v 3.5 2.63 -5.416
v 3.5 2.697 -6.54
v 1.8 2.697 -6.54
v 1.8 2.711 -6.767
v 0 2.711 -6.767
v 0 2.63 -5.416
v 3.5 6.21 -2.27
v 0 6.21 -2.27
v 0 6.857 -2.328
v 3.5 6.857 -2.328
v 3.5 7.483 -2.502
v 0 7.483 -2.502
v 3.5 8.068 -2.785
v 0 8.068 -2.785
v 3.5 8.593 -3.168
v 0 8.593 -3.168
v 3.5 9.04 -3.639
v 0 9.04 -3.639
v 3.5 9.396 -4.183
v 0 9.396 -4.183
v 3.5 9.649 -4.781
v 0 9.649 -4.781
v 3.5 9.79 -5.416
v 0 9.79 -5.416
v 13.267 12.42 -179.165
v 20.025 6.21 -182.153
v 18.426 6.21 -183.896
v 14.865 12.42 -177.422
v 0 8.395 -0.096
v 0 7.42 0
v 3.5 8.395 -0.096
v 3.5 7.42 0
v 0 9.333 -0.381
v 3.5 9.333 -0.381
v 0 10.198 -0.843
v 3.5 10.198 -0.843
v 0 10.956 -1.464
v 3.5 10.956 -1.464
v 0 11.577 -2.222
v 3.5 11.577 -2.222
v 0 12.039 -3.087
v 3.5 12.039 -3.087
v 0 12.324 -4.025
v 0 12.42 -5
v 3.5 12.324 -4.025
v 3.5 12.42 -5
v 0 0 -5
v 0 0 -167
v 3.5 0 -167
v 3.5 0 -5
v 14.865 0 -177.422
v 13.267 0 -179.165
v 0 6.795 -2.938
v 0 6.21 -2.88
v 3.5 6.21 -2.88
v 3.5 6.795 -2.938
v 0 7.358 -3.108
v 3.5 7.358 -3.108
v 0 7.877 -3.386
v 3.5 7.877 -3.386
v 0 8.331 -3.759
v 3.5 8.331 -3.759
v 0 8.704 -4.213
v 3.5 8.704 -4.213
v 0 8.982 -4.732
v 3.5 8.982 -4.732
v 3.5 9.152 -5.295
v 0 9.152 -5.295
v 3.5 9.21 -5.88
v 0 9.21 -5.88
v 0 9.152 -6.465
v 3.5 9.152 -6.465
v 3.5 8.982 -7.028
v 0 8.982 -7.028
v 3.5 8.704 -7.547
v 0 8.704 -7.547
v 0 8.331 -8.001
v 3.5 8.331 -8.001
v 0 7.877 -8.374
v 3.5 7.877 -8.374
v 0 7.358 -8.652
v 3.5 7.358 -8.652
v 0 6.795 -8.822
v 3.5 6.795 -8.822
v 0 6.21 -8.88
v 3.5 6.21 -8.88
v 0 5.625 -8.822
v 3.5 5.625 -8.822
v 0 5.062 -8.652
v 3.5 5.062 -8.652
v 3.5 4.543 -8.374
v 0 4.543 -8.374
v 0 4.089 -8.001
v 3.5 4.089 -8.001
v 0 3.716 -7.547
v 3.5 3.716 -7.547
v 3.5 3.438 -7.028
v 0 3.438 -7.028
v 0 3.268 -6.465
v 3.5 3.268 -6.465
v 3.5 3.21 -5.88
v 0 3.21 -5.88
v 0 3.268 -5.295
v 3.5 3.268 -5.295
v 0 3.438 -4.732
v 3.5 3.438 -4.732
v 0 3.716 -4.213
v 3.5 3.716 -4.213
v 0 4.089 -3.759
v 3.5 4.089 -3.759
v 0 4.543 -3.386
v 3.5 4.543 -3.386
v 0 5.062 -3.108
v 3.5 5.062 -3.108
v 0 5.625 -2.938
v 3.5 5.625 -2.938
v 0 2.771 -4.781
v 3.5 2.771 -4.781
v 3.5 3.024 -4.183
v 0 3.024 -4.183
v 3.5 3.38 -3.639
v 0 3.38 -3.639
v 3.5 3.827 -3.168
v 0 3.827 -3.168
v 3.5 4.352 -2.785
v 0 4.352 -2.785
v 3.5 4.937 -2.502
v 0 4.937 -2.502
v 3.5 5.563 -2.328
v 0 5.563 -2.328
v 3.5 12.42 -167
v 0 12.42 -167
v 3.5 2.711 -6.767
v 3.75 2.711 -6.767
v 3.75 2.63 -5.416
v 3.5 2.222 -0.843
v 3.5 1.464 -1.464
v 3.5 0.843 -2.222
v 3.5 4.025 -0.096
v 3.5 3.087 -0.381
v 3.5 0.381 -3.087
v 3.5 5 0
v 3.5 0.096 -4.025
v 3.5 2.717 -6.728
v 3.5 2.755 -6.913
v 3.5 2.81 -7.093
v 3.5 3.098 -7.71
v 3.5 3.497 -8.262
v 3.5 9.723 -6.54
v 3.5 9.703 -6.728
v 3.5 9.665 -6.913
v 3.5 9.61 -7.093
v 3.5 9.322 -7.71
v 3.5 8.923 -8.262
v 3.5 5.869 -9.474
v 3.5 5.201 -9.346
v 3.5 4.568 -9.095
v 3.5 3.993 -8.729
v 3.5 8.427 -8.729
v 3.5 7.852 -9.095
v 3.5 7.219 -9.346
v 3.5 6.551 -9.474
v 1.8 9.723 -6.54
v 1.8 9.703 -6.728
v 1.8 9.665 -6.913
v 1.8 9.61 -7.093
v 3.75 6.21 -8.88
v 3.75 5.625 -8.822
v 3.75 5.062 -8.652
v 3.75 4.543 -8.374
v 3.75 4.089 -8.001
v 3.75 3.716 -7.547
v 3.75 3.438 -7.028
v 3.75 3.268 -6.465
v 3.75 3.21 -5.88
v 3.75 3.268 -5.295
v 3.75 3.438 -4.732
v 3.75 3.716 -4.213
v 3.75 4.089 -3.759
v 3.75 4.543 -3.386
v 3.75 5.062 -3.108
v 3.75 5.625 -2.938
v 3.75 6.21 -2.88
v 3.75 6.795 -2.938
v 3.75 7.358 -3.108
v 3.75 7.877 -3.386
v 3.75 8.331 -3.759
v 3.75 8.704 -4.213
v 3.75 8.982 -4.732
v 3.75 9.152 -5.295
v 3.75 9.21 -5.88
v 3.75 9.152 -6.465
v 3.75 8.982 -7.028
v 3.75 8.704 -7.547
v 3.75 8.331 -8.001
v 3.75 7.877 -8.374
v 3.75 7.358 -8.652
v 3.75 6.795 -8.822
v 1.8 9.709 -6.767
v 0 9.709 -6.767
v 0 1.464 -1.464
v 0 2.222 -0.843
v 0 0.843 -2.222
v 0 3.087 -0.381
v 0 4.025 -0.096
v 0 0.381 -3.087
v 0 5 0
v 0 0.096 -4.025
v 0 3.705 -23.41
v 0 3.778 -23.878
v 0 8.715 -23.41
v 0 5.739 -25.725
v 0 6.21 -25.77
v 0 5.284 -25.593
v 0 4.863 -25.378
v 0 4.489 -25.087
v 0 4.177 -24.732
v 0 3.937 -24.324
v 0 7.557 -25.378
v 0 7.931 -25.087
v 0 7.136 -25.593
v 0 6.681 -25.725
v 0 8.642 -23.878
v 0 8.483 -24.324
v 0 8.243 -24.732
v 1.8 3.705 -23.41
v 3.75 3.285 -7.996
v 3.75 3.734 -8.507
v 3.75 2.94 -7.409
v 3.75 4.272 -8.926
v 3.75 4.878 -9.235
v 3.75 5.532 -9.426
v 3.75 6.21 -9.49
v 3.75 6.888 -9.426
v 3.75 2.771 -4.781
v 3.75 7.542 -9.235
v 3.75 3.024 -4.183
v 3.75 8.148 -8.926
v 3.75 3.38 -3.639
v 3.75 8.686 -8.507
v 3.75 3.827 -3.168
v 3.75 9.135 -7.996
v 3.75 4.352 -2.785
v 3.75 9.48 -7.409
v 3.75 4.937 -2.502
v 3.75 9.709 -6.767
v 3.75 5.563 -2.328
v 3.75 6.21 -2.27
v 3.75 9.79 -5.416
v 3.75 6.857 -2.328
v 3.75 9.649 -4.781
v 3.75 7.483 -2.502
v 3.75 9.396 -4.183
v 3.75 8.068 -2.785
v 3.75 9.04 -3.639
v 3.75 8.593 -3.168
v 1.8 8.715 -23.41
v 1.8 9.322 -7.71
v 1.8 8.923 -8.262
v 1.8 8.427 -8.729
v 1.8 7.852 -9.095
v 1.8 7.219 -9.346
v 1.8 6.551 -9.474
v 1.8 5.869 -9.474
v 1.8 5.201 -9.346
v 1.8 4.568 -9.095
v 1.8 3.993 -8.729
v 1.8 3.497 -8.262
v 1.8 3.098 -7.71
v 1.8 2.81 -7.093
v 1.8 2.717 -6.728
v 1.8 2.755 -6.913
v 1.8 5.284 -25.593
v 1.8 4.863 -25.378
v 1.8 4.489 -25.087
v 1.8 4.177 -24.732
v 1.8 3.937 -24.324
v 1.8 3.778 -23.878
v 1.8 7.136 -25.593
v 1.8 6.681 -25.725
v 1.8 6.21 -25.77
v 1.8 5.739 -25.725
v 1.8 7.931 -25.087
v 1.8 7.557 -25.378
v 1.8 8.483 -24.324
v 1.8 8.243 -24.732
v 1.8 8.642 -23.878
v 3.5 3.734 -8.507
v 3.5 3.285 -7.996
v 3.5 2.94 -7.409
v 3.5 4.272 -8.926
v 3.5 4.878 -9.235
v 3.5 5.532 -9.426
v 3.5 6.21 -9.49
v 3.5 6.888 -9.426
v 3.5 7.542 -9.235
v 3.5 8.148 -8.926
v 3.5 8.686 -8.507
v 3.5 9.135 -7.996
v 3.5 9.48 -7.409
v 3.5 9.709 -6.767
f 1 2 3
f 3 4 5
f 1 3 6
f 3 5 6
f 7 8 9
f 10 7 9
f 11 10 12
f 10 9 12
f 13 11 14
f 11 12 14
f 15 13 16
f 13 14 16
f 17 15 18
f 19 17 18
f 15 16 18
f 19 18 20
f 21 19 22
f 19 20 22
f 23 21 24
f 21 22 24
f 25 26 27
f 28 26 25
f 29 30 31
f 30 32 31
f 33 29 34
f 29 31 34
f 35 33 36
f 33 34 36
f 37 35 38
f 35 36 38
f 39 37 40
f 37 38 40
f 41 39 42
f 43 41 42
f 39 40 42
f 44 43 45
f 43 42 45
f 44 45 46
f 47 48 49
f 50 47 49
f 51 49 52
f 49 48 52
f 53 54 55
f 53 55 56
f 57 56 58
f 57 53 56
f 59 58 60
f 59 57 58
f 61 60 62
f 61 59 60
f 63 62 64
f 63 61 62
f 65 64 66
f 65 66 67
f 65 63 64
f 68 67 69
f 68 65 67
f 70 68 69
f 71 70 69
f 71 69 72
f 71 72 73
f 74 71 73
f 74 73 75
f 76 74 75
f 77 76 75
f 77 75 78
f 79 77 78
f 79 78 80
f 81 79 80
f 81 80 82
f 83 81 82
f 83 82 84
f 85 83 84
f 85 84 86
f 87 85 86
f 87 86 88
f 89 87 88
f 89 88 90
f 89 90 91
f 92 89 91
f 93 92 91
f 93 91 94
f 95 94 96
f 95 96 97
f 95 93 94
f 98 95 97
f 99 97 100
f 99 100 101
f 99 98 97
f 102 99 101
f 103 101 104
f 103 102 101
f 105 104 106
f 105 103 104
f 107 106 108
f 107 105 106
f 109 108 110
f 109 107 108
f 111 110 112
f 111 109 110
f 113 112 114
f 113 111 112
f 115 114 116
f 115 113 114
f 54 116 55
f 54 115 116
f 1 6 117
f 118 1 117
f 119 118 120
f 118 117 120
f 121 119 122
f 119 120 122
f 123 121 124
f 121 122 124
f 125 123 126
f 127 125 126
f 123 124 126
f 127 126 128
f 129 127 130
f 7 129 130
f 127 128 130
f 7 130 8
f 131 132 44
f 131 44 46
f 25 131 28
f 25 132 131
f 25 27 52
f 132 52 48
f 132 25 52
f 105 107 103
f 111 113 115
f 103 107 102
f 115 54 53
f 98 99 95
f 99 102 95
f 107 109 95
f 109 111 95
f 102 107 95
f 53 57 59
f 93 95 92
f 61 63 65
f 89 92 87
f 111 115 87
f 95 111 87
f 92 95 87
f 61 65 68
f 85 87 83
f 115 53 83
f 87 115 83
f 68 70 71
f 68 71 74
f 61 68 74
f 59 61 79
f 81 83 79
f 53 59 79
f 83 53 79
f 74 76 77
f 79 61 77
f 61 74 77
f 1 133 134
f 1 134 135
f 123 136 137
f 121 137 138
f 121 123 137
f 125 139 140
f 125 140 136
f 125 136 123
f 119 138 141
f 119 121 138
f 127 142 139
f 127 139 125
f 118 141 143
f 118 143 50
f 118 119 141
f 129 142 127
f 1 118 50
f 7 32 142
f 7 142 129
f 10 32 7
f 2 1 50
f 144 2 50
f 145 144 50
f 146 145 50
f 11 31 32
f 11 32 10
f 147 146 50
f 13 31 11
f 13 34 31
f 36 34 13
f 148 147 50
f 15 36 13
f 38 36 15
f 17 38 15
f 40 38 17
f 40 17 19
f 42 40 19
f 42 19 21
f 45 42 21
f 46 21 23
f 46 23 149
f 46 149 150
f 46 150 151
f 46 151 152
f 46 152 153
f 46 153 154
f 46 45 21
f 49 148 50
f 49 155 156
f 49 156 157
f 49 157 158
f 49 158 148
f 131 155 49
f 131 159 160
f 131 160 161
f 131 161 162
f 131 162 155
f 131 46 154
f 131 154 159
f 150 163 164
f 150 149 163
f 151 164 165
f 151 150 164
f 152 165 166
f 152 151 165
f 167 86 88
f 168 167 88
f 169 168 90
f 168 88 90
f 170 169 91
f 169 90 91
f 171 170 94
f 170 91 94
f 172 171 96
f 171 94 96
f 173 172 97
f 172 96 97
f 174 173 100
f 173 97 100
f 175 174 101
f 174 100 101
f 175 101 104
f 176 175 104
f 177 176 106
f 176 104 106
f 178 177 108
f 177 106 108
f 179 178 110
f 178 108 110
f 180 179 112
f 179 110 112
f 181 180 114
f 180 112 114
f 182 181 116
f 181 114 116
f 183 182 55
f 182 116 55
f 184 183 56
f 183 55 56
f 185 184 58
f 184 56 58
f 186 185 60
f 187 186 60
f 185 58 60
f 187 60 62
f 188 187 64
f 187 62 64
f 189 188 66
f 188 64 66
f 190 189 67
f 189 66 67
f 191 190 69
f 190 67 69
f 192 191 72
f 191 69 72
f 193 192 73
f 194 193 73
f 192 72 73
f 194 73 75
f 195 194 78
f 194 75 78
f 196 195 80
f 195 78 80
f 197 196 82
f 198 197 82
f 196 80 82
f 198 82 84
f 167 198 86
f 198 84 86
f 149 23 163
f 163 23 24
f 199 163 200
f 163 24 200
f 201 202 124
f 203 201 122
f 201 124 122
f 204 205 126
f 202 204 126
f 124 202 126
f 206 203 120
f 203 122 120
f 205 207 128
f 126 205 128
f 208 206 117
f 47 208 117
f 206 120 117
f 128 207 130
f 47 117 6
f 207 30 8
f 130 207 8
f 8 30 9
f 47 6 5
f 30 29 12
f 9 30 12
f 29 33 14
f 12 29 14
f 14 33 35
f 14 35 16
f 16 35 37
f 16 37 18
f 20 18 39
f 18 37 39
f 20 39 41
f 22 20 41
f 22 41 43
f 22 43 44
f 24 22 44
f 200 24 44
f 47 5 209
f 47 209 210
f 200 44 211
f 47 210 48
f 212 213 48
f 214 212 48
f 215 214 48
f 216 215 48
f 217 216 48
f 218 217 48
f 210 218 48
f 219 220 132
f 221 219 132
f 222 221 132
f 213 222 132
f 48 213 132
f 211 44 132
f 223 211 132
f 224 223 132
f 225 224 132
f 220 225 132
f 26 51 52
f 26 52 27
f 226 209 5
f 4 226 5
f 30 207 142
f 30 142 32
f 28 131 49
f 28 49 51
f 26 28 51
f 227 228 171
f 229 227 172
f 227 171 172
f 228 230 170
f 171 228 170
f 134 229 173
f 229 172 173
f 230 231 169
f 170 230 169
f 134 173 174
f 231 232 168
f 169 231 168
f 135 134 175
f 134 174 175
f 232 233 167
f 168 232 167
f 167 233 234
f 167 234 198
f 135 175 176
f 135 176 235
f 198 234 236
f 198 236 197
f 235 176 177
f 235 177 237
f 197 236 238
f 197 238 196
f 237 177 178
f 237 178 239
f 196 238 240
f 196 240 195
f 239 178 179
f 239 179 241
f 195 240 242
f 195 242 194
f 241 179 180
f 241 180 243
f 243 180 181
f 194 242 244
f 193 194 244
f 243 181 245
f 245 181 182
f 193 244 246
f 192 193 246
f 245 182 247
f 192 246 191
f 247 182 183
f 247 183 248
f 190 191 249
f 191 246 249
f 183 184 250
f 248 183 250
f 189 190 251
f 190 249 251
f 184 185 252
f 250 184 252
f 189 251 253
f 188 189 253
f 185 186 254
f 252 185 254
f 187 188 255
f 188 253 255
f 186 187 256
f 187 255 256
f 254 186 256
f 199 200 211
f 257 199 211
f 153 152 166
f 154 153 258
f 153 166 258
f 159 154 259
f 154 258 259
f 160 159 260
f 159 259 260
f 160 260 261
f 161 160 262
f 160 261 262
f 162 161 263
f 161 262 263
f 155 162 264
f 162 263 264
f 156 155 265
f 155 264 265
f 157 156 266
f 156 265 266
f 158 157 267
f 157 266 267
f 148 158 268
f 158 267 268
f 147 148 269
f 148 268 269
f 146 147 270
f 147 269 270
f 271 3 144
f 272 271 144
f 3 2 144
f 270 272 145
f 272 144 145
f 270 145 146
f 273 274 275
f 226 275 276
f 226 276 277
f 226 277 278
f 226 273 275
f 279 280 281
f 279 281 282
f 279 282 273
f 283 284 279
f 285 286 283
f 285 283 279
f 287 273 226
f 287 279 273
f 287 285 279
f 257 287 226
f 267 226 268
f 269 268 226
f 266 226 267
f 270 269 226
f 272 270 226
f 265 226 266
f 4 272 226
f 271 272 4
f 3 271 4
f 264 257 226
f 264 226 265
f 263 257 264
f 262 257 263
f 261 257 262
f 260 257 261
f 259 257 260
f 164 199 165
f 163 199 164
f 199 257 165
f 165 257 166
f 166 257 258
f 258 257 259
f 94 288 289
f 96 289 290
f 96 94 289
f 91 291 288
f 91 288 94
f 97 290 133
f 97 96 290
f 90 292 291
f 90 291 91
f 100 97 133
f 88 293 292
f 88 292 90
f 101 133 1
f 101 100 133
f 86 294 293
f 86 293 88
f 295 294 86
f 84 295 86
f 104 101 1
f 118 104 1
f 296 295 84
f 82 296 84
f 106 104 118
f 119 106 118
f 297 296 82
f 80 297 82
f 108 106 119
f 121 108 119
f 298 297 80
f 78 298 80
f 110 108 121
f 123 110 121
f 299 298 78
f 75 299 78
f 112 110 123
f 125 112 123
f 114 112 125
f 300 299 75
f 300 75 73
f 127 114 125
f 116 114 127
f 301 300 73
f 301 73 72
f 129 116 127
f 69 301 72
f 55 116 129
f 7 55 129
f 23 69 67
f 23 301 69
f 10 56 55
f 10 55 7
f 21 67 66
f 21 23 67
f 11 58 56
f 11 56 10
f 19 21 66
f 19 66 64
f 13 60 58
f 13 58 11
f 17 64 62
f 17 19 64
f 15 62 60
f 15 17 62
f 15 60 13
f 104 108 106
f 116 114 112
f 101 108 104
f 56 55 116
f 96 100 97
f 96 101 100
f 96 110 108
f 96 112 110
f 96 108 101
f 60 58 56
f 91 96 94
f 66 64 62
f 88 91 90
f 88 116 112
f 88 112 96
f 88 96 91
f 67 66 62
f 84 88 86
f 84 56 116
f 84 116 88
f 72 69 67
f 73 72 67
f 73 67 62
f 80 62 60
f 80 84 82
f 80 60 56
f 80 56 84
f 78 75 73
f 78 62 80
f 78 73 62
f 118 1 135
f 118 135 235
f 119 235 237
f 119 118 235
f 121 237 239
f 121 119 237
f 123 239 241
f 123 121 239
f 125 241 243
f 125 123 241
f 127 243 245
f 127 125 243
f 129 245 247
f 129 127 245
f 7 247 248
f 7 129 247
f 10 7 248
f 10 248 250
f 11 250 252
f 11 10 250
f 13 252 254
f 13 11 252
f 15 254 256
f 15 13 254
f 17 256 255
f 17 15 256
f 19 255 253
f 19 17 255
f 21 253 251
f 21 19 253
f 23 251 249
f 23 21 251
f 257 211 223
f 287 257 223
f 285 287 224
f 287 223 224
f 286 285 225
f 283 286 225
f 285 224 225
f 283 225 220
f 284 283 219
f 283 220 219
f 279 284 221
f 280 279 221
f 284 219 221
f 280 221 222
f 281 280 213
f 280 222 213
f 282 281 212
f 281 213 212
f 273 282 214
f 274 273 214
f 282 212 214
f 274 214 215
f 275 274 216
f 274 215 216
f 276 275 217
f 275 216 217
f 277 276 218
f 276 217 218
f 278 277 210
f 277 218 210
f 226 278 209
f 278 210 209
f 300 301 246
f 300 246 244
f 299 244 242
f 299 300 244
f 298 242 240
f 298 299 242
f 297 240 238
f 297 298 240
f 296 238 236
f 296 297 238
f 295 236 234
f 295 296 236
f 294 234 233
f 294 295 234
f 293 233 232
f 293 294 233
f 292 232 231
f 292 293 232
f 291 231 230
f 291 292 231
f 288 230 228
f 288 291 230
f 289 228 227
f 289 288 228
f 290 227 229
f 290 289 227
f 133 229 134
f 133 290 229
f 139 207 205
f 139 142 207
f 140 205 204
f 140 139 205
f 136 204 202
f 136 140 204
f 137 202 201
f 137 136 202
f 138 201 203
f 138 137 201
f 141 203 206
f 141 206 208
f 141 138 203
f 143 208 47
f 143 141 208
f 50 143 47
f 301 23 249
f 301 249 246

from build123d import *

# Parameters (mm, degrees)
SKETCH1_W               = 167
SKETCH1_H               = 12.42
BOSS_EXTRUDE1_DEPTH     = 3.5
SKETCH7_R               = 3
CUT_EXTRUDE1_DEPTH      = 188.444675571
CUT_EXTRUDE2_DEPTH      = 1.8
FILLET1_R               = 5
FILLET2_R               = 2
BOSS_EXTRUDE2_START     = -3.5
SKETCH7_5_R             = 3
BOSS_EXTRUDE2_DEPTH     = 0.25
CUT_EXTRUDE5_DEPTH      = 188.449510269
CUT_EXTRUDE5_DEPTH_BACK = 188.449510269
BOSS_EXTRUDE3_DEPTH     = 12.42
CUT_EXTRUDE7_DEPTH      = 140.602620265
CUT_EXTRUDE7_DEPTH_BACK = 140.602620265


with BuildPart() as part:
    # Sketch1 → Boss-Extrude1 (new body)
    with BuildSketch(Plane(origin=(0, 0, 0), x_dir=(0, 0, -1), z_dir=(1, 0, 0))):
        with Locations((83.5, 6.21)):
            Rectangle(SKETCH1_W, SKETCH1_H)
        Polygon((180, 0), (167, 0), (167, 12.42), (180, 12.42), (187, 6.21), align=None)
    extrude(amount=BOSS_EXTRUDE1_DEPTH)

    # Sketch7 → Cut-Extrude1 (cut, through all)
    with BuildSketch(Plane.ZY):
        with BuildLine():
            ThreePointArc((-2.27, 6.21), (-3.168108515, 8.592801832), (-5.415564859, 9.79))
            Line((-5.415564859, 9.79), (-6.76734979, 9.709244254))
            ThreePointArc((-6.76734979, 9.709244254), (-9.49, 6.21), (-6.76734979, 2.710755746))
            Line((-6.76734979, 2.710755746), (-5.415564859, 2.63))
            ThreePointArc((-5.415564859, 2.63), (-3.168108515, 3.827198168), (-2.27, 6.21))
        make_face()
        with Locations((-5.88, 6.21)):
            Circle(SKETCH7_R, mode=Mode.SUBTRACT)
    extrude(amount=-CUT_EXTRUDE1_DEPTH, mode=Mode.SUBTRACT)


with BuildPart() as cut_extrude1_piece_1:
    # of the separate pieces the step leaves, piece 1, a body of its own (cut_extrude1_pieces)
    add(part.part.solids().sort_by_distance((0, 0, 0))[0])

    # Sketch7<3> → Cut-Extrude2 (cut)
    with BuildSketch(Plane.ZY):
        with BuildLine():
            ThreePointArc((-6.76734979, 2.710755746), (-9.49, 6.21), (-6.76734979, 9.709244254))
            Line((-6.76734979, 9.709244254), (-23.410182873, 8.715))
            ThreePointArc((-23.410182873, 8.715), (-25.77, 6.21), (-23.410182873, 3.705))
            Line((-23.410182873, 3.705), (-6.76734979, 2.710755746))
        make_face()
    extrude(amount=-CUT_EXTRUDE2_DEPTH, mode=Mode.SUBTRACT)

    # Fillet1
    fillet1_edges = [cut_extrude1_piece_1.edges().sort_by_distance(p)[0] for p in [
        (1.75, 0, 0),
        (1.75, 12.42, 0),
    ]]
    fillet(fillet1_edges, radius=FILLET1_R)

    # Fillet2
    fillet2_edges = [cut_extrude1_piece_1.edges().sort_by_distance(p)[0] for p in [
        (2.65, 9.709244254, -6.76734979),
        (2.65, 2.710755746, -6.76734979),
    ]]
    fillet(fillet2_edges, radius=FILLET2_R)

    # Sketch1<4> → Cut-Extrude5 (cut, two sides: drawn at the far end of the back side and taken through both)
    with BuildSketch(Plane(origin=(0, 0, 0), x_dir=(0, 0, -1), z_dir=(1, 0, 0)).offset(-CUT_EXTRUDE5_DEPTH_BACK)):
        Polygon((180, 0), (167, 0), (167, 12.42), (180, 12.42), (187, 6.21), align=None)
    extrude(amount=CUT_EXTRUDE5_DEPTH + CUT_EXTRUDE5_DEPTH_BACK, mode=Mode.SUBTRACT)

    # Sketch8 → Boss-Extrude3 (add)
    with BuildSketch(Plane(origin=(0, 12.42, 0), x_dir=(1, 0, 0), z_dir=(0, 1, 0))):
        Polygon((3.5, 167), (20.024731229, 182.152741342), (18.426036661, 183.89618812), (0, 167), align=None)
    extrude(amount=-BOSS_EXTRUDE3_DEPTH)

    # Sketch9 → Cut-Extrude7 (cut, two sides: drawn at the far end of the back side and taken through both)
    with BuildSketch(Plane(origin=(-83.187317676, 0, -90.71943058), x_dir=(-0.737041466427066, 0, 0.6758475247916796), z_dir=(-0.6758475247916796, 0, -0.737041466427066)).offset(-CUT_EXTRUDE7_DEPTH_BACK)):
        Polygon((-137.86653664, 12.42), (-137.86653664, 6.21), (-130.86653664, 12.42), align=None)
        Polygon((-130.86653664, 0), (-137.86653664, 6.21), (-137.86653664, 0), align=None)
    extrude(amount=CUT_EXTRUDE7_DEPTH + CUT_EXTRUDE7_DEPTH_BACK, mode=Mode.SUBTRACT)


with BuildPart() as cut_extrude1_piece_2:
    # of the separate pieces the step leaves, piece 2, a body of its own (cut_extrude1_pieces)
    add(part.part.solids().sort_by_distance((3.5, 6.21, -2.88))[0])


with BuildPart() as body_3:
    # Sketch7<5> → Boss-Extrude2 (new body)
    with BuildSketch(Plane.ZY.offset(BOSS_EXTRUDE2_START)):
        with BuildLine():
            ThreePointArc((-2.27, 6.21), (-3.168108515, 8.592801832), (-5.415564859, 9.79))
            Line((-5.415564859, 9.79), (-6.76734979, 9.709244254))
            ThreePointArc((-6.76734979, 9.709244254), (-9.49, 6.21), (-6.76734979, 2.710755746))
            Line((-6.76734979, 2.710755746), (-5.415564859, 2.63))
            ThreePointArc((-5.415564859, 2.63), (-3.168108515, 3.827198168), (-2.27, 6.21))
        make_face()
        with Locations(Location((-5.88, 6.21, 0), (0, 0, 180))):
            Circle(SKETCH7_5_R, mode=Mode.SUBTRACT)
    extrude(amount=-BOSS_EXTRUDE2_DEPTH)


solid = Compound([cut_extrude1_piece_1.part, cut_extrude1_piece_2.part, body_3.part])
